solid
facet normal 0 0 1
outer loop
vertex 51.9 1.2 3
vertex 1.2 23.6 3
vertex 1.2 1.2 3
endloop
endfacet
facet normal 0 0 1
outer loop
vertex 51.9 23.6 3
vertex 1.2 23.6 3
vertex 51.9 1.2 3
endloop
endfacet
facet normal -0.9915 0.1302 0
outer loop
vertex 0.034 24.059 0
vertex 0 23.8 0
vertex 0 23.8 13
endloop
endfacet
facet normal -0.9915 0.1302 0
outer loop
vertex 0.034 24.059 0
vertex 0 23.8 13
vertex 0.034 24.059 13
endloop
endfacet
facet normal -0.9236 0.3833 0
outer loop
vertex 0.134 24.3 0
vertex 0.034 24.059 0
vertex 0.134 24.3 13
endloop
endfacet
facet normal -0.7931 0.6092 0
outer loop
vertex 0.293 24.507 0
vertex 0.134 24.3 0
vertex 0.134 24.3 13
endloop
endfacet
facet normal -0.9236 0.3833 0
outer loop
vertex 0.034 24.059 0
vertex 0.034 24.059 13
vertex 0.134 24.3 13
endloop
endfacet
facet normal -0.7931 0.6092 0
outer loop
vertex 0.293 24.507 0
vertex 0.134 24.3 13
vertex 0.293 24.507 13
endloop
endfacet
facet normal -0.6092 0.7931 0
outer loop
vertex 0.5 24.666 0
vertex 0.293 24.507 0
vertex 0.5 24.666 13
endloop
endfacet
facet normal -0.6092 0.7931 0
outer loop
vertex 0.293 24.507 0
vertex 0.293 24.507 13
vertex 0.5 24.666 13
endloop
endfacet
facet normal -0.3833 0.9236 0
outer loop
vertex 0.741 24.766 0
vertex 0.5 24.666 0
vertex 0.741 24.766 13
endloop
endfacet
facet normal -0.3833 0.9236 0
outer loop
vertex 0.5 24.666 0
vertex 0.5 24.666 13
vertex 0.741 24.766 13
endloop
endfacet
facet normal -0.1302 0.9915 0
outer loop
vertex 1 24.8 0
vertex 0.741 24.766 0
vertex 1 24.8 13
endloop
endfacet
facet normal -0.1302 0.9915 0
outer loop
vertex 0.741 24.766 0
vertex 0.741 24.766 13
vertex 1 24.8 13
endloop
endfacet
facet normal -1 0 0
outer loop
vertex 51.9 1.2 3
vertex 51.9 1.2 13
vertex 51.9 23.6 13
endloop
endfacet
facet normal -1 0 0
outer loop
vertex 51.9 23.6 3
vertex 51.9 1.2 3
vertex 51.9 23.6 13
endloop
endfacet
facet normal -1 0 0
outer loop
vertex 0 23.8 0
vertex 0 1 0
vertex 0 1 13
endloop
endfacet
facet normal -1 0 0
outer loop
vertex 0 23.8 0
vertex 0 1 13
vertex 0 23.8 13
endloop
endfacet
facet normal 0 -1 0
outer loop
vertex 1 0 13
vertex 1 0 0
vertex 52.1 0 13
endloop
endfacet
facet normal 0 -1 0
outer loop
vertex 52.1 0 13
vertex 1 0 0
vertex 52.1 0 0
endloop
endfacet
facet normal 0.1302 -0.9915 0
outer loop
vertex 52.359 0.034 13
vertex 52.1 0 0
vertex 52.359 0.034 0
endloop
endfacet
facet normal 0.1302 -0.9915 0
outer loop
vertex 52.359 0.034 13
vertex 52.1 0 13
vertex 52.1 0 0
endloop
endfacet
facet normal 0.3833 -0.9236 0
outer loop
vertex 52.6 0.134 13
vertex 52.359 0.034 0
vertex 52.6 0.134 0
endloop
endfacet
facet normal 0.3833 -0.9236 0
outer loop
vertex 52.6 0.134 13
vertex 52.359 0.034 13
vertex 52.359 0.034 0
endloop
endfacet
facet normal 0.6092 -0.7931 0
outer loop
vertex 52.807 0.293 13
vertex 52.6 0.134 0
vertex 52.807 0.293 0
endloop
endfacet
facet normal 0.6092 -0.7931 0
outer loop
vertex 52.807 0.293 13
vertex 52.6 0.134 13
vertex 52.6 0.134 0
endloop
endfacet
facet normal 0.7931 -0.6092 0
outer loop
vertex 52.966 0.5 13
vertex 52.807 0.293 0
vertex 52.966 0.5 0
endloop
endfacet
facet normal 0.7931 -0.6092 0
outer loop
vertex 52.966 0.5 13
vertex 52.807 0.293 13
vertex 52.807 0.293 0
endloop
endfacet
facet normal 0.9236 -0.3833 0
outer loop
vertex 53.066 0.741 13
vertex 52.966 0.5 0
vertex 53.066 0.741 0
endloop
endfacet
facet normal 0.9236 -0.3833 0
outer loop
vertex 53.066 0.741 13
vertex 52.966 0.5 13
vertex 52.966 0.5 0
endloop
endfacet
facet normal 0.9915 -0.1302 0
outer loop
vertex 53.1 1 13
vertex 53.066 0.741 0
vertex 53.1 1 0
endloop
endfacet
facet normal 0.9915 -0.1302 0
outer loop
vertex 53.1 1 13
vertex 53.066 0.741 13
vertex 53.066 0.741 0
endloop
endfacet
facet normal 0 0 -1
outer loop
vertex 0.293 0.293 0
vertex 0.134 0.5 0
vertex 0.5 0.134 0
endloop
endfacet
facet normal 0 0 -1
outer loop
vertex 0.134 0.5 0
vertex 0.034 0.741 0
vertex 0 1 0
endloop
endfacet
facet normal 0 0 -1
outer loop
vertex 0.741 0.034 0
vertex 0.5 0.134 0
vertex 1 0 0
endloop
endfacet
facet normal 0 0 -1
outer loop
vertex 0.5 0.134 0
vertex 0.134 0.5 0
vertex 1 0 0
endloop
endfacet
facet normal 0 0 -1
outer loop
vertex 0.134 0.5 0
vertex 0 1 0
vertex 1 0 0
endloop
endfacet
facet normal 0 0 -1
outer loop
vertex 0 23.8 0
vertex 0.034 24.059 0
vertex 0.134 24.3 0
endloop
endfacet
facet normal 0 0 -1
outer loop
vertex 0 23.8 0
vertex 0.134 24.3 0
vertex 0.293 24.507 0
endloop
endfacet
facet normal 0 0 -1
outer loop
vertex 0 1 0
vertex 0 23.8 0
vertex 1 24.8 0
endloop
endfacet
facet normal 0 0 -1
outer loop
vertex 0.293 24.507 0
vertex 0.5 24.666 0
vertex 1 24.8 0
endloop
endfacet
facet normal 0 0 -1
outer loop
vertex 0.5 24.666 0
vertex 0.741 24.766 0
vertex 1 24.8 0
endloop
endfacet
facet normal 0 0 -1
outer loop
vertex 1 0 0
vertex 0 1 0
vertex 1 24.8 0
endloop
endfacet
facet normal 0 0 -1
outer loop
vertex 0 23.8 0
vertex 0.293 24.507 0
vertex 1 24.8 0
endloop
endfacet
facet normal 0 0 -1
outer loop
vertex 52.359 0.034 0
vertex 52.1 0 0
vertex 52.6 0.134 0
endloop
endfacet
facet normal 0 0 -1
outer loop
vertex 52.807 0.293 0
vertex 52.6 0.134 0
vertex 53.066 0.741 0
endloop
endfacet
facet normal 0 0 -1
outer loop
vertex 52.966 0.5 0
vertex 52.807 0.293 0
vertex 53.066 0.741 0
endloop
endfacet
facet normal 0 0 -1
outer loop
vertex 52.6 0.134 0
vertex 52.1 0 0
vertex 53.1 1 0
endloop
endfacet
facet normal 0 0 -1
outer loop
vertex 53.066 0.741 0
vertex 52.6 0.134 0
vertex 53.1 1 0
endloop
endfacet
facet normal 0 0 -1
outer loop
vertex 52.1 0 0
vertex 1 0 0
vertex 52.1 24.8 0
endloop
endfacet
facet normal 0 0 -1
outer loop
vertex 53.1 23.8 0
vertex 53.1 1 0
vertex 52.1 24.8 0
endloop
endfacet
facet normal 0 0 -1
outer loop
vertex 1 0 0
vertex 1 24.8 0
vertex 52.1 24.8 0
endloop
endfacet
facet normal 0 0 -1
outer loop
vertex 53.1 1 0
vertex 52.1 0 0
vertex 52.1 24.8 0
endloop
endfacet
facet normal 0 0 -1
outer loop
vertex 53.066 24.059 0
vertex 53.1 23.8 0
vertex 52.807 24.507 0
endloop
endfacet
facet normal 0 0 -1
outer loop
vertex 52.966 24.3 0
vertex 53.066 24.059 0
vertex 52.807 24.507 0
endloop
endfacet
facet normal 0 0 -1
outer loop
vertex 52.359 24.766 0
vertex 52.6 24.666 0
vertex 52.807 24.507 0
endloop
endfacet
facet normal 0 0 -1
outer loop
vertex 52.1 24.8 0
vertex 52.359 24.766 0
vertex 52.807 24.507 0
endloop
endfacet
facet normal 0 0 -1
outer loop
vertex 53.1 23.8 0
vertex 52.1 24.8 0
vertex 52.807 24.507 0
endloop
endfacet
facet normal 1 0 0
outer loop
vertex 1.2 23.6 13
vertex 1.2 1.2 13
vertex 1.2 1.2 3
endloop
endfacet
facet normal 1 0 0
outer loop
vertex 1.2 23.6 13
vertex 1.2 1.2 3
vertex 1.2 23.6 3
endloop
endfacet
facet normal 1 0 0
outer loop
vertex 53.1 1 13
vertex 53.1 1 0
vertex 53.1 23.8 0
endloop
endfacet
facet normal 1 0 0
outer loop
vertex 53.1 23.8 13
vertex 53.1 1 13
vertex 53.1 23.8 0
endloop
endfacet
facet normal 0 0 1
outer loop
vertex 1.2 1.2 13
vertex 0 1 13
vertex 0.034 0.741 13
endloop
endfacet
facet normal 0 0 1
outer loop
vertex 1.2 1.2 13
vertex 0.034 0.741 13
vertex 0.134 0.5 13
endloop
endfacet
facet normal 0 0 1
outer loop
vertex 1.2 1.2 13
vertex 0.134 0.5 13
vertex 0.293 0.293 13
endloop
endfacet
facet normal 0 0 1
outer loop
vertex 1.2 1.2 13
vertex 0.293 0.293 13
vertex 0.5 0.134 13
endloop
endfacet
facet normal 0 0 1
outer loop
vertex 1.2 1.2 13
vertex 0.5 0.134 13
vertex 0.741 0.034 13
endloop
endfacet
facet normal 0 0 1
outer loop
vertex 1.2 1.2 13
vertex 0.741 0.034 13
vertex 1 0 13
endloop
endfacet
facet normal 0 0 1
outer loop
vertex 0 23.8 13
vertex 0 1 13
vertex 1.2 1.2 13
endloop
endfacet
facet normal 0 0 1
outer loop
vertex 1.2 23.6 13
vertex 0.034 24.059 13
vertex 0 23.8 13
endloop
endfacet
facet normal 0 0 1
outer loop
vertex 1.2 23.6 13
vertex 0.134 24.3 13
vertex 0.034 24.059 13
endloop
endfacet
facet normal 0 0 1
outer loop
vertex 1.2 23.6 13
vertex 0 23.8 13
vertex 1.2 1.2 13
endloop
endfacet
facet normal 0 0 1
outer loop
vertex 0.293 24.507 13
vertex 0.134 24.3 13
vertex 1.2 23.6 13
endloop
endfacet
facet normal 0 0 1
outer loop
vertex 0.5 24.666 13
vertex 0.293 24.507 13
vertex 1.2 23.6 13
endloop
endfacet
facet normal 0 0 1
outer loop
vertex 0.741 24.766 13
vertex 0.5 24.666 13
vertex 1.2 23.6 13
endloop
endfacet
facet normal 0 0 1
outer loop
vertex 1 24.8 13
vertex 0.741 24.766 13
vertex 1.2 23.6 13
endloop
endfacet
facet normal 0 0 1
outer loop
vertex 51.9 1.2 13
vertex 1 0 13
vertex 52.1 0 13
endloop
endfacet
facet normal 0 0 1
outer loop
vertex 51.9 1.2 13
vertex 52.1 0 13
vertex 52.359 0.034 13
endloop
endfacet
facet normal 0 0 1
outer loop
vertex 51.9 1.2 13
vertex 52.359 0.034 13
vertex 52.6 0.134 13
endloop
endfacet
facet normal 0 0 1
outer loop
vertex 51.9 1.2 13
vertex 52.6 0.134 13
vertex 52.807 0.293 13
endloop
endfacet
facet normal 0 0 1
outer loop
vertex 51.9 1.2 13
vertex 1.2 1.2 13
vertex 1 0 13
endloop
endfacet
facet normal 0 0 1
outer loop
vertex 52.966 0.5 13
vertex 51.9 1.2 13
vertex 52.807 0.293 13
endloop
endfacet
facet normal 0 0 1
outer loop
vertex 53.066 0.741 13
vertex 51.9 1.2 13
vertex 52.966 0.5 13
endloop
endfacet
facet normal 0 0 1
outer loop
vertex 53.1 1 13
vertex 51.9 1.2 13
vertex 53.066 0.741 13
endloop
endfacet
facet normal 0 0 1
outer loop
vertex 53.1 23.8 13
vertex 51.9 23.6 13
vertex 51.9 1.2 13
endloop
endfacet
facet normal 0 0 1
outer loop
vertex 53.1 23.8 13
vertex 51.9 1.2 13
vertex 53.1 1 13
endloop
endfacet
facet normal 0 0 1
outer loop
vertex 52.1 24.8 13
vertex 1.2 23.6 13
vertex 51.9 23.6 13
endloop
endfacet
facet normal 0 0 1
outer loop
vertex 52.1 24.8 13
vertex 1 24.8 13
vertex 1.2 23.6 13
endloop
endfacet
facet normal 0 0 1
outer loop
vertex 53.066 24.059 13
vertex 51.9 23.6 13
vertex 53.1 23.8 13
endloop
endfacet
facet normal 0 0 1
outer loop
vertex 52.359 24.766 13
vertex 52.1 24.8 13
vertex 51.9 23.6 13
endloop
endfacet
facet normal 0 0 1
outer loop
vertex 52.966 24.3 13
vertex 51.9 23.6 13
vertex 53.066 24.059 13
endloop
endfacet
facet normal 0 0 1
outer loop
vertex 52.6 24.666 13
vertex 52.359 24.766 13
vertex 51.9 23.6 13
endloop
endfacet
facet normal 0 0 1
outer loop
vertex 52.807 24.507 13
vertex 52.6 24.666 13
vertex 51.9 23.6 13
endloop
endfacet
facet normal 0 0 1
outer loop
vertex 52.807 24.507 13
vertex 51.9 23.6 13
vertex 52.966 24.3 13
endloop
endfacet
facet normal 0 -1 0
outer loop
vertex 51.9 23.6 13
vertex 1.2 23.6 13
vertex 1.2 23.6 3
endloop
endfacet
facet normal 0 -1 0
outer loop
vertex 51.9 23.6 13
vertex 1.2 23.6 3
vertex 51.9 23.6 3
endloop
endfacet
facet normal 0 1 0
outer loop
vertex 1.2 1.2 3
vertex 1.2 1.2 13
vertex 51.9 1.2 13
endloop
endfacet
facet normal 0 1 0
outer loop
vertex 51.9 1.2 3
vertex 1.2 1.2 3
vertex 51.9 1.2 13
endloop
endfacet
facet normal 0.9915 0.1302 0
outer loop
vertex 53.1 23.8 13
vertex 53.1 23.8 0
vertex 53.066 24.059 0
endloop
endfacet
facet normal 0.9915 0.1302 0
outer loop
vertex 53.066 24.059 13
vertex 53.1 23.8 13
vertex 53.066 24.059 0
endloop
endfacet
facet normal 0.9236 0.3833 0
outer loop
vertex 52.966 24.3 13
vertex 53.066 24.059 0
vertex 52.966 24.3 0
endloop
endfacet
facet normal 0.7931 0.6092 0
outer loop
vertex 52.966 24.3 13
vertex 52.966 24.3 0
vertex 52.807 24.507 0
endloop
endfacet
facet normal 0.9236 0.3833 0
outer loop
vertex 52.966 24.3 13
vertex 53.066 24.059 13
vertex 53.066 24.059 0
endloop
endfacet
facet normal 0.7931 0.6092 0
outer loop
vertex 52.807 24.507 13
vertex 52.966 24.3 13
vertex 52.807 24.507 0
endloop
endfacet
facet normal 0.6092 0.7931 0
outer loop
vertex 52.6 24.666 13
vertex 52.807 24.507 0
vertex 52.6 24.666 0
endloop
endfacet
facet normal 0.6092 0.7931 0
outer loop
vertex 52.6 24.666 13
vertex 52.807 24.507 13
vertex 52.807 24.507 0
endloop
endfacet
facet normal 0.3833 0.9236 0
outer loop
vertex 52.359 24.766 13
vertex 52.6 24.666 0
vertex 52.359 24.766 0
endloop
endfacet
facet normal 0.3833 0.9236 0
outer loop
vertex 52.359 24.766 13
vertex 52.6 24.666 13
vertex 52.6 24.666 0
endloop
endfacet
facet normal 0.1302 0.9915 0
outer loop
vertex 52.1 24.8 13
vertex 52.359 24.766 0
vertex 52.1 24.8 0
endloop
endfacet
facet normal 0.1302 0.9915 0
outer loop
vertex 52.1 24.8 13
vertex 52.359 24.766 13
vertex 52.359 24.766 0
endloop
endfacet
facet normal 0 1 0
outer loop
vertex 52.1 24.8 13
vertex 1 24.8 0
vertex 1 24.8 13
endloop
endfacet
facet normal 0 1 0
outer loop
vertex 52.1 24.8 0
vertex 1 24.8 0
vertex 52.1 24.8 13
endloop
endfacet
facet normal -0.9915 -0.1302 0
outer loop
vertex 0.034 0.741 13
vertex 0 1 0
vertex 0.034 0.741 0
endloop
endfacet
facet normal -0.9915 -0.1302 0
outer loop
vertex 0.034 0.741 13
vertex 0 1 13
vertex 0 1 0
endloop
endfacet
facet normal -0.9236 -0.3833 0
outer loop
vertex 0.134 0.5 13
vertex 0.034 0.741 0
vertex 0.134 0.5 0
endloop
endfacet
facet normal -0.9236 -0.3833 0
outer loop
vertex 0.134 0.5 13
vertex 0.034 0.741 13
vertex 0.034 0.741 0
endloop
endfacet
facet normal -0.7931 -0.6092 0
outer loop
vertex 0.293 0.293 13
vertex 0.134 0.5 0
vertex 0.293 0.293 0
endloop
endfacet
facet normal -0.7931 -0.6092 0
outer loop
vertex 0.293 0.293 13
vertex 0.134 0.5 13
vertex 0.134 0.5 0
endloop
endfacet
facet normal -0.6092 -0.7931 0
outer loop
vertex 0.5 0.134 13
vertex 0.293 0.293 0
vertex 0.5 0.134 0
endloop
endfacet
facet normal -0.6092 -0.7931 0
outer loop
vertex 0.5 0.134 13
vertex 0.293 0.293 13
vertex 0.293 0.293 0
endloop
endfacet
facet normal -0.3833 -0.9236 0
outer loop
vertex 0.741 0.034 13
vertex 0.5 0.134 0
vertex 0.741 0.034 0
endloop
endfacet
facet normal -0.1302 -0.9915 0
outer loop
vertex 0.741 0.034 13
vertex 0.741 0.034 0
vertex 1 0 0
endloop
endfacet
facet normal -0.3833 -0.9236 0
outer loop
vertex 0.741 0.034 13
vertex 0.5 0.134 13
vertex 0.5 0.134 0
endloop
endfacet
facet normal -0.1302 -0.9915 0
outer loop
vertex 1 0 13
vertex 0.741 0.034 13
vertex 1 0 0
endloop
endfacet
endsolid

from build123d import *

# Parameters (mm, degrees)
F0_W     = 53.1
F0_H     = 24.8
F1_DEPTH = 13
F2_R     = 1
F3_W     = 50.7
F3_H     = 22.4
F4_DEPTH = 10


with BuildPart() as f1:
    # F0 (on Top) → F1 (new body)
    with BuildSketch(Plane.XY):
        with Locations((26.55, 12.4)):
            Rectangle(F0_W, F0_H)
    extrude(amount=F1_DEPTH)

    # F2
    f2_edges = [f1.edges().sort_by_distance(p)[0] for p in [
        (53.1, 24.8, 6.5),
        (53.1, 0, 6.5),
        (0, 24.8, 6.5),
        (0, 0, 6.5),
    ]]
    fillet(f2_edges, radius=F2_R)

    # F3 (on face) → F4 (cut)
    with BuildSketch(Plane.XY.offset(13)):
        with Locations((26.55, 12.4)):
            Rectangle(F3_W, F3_H)
    extrude(amount=-F4_DEPTH, mode=Mode.SUBTRACT)


solid = f1.part
